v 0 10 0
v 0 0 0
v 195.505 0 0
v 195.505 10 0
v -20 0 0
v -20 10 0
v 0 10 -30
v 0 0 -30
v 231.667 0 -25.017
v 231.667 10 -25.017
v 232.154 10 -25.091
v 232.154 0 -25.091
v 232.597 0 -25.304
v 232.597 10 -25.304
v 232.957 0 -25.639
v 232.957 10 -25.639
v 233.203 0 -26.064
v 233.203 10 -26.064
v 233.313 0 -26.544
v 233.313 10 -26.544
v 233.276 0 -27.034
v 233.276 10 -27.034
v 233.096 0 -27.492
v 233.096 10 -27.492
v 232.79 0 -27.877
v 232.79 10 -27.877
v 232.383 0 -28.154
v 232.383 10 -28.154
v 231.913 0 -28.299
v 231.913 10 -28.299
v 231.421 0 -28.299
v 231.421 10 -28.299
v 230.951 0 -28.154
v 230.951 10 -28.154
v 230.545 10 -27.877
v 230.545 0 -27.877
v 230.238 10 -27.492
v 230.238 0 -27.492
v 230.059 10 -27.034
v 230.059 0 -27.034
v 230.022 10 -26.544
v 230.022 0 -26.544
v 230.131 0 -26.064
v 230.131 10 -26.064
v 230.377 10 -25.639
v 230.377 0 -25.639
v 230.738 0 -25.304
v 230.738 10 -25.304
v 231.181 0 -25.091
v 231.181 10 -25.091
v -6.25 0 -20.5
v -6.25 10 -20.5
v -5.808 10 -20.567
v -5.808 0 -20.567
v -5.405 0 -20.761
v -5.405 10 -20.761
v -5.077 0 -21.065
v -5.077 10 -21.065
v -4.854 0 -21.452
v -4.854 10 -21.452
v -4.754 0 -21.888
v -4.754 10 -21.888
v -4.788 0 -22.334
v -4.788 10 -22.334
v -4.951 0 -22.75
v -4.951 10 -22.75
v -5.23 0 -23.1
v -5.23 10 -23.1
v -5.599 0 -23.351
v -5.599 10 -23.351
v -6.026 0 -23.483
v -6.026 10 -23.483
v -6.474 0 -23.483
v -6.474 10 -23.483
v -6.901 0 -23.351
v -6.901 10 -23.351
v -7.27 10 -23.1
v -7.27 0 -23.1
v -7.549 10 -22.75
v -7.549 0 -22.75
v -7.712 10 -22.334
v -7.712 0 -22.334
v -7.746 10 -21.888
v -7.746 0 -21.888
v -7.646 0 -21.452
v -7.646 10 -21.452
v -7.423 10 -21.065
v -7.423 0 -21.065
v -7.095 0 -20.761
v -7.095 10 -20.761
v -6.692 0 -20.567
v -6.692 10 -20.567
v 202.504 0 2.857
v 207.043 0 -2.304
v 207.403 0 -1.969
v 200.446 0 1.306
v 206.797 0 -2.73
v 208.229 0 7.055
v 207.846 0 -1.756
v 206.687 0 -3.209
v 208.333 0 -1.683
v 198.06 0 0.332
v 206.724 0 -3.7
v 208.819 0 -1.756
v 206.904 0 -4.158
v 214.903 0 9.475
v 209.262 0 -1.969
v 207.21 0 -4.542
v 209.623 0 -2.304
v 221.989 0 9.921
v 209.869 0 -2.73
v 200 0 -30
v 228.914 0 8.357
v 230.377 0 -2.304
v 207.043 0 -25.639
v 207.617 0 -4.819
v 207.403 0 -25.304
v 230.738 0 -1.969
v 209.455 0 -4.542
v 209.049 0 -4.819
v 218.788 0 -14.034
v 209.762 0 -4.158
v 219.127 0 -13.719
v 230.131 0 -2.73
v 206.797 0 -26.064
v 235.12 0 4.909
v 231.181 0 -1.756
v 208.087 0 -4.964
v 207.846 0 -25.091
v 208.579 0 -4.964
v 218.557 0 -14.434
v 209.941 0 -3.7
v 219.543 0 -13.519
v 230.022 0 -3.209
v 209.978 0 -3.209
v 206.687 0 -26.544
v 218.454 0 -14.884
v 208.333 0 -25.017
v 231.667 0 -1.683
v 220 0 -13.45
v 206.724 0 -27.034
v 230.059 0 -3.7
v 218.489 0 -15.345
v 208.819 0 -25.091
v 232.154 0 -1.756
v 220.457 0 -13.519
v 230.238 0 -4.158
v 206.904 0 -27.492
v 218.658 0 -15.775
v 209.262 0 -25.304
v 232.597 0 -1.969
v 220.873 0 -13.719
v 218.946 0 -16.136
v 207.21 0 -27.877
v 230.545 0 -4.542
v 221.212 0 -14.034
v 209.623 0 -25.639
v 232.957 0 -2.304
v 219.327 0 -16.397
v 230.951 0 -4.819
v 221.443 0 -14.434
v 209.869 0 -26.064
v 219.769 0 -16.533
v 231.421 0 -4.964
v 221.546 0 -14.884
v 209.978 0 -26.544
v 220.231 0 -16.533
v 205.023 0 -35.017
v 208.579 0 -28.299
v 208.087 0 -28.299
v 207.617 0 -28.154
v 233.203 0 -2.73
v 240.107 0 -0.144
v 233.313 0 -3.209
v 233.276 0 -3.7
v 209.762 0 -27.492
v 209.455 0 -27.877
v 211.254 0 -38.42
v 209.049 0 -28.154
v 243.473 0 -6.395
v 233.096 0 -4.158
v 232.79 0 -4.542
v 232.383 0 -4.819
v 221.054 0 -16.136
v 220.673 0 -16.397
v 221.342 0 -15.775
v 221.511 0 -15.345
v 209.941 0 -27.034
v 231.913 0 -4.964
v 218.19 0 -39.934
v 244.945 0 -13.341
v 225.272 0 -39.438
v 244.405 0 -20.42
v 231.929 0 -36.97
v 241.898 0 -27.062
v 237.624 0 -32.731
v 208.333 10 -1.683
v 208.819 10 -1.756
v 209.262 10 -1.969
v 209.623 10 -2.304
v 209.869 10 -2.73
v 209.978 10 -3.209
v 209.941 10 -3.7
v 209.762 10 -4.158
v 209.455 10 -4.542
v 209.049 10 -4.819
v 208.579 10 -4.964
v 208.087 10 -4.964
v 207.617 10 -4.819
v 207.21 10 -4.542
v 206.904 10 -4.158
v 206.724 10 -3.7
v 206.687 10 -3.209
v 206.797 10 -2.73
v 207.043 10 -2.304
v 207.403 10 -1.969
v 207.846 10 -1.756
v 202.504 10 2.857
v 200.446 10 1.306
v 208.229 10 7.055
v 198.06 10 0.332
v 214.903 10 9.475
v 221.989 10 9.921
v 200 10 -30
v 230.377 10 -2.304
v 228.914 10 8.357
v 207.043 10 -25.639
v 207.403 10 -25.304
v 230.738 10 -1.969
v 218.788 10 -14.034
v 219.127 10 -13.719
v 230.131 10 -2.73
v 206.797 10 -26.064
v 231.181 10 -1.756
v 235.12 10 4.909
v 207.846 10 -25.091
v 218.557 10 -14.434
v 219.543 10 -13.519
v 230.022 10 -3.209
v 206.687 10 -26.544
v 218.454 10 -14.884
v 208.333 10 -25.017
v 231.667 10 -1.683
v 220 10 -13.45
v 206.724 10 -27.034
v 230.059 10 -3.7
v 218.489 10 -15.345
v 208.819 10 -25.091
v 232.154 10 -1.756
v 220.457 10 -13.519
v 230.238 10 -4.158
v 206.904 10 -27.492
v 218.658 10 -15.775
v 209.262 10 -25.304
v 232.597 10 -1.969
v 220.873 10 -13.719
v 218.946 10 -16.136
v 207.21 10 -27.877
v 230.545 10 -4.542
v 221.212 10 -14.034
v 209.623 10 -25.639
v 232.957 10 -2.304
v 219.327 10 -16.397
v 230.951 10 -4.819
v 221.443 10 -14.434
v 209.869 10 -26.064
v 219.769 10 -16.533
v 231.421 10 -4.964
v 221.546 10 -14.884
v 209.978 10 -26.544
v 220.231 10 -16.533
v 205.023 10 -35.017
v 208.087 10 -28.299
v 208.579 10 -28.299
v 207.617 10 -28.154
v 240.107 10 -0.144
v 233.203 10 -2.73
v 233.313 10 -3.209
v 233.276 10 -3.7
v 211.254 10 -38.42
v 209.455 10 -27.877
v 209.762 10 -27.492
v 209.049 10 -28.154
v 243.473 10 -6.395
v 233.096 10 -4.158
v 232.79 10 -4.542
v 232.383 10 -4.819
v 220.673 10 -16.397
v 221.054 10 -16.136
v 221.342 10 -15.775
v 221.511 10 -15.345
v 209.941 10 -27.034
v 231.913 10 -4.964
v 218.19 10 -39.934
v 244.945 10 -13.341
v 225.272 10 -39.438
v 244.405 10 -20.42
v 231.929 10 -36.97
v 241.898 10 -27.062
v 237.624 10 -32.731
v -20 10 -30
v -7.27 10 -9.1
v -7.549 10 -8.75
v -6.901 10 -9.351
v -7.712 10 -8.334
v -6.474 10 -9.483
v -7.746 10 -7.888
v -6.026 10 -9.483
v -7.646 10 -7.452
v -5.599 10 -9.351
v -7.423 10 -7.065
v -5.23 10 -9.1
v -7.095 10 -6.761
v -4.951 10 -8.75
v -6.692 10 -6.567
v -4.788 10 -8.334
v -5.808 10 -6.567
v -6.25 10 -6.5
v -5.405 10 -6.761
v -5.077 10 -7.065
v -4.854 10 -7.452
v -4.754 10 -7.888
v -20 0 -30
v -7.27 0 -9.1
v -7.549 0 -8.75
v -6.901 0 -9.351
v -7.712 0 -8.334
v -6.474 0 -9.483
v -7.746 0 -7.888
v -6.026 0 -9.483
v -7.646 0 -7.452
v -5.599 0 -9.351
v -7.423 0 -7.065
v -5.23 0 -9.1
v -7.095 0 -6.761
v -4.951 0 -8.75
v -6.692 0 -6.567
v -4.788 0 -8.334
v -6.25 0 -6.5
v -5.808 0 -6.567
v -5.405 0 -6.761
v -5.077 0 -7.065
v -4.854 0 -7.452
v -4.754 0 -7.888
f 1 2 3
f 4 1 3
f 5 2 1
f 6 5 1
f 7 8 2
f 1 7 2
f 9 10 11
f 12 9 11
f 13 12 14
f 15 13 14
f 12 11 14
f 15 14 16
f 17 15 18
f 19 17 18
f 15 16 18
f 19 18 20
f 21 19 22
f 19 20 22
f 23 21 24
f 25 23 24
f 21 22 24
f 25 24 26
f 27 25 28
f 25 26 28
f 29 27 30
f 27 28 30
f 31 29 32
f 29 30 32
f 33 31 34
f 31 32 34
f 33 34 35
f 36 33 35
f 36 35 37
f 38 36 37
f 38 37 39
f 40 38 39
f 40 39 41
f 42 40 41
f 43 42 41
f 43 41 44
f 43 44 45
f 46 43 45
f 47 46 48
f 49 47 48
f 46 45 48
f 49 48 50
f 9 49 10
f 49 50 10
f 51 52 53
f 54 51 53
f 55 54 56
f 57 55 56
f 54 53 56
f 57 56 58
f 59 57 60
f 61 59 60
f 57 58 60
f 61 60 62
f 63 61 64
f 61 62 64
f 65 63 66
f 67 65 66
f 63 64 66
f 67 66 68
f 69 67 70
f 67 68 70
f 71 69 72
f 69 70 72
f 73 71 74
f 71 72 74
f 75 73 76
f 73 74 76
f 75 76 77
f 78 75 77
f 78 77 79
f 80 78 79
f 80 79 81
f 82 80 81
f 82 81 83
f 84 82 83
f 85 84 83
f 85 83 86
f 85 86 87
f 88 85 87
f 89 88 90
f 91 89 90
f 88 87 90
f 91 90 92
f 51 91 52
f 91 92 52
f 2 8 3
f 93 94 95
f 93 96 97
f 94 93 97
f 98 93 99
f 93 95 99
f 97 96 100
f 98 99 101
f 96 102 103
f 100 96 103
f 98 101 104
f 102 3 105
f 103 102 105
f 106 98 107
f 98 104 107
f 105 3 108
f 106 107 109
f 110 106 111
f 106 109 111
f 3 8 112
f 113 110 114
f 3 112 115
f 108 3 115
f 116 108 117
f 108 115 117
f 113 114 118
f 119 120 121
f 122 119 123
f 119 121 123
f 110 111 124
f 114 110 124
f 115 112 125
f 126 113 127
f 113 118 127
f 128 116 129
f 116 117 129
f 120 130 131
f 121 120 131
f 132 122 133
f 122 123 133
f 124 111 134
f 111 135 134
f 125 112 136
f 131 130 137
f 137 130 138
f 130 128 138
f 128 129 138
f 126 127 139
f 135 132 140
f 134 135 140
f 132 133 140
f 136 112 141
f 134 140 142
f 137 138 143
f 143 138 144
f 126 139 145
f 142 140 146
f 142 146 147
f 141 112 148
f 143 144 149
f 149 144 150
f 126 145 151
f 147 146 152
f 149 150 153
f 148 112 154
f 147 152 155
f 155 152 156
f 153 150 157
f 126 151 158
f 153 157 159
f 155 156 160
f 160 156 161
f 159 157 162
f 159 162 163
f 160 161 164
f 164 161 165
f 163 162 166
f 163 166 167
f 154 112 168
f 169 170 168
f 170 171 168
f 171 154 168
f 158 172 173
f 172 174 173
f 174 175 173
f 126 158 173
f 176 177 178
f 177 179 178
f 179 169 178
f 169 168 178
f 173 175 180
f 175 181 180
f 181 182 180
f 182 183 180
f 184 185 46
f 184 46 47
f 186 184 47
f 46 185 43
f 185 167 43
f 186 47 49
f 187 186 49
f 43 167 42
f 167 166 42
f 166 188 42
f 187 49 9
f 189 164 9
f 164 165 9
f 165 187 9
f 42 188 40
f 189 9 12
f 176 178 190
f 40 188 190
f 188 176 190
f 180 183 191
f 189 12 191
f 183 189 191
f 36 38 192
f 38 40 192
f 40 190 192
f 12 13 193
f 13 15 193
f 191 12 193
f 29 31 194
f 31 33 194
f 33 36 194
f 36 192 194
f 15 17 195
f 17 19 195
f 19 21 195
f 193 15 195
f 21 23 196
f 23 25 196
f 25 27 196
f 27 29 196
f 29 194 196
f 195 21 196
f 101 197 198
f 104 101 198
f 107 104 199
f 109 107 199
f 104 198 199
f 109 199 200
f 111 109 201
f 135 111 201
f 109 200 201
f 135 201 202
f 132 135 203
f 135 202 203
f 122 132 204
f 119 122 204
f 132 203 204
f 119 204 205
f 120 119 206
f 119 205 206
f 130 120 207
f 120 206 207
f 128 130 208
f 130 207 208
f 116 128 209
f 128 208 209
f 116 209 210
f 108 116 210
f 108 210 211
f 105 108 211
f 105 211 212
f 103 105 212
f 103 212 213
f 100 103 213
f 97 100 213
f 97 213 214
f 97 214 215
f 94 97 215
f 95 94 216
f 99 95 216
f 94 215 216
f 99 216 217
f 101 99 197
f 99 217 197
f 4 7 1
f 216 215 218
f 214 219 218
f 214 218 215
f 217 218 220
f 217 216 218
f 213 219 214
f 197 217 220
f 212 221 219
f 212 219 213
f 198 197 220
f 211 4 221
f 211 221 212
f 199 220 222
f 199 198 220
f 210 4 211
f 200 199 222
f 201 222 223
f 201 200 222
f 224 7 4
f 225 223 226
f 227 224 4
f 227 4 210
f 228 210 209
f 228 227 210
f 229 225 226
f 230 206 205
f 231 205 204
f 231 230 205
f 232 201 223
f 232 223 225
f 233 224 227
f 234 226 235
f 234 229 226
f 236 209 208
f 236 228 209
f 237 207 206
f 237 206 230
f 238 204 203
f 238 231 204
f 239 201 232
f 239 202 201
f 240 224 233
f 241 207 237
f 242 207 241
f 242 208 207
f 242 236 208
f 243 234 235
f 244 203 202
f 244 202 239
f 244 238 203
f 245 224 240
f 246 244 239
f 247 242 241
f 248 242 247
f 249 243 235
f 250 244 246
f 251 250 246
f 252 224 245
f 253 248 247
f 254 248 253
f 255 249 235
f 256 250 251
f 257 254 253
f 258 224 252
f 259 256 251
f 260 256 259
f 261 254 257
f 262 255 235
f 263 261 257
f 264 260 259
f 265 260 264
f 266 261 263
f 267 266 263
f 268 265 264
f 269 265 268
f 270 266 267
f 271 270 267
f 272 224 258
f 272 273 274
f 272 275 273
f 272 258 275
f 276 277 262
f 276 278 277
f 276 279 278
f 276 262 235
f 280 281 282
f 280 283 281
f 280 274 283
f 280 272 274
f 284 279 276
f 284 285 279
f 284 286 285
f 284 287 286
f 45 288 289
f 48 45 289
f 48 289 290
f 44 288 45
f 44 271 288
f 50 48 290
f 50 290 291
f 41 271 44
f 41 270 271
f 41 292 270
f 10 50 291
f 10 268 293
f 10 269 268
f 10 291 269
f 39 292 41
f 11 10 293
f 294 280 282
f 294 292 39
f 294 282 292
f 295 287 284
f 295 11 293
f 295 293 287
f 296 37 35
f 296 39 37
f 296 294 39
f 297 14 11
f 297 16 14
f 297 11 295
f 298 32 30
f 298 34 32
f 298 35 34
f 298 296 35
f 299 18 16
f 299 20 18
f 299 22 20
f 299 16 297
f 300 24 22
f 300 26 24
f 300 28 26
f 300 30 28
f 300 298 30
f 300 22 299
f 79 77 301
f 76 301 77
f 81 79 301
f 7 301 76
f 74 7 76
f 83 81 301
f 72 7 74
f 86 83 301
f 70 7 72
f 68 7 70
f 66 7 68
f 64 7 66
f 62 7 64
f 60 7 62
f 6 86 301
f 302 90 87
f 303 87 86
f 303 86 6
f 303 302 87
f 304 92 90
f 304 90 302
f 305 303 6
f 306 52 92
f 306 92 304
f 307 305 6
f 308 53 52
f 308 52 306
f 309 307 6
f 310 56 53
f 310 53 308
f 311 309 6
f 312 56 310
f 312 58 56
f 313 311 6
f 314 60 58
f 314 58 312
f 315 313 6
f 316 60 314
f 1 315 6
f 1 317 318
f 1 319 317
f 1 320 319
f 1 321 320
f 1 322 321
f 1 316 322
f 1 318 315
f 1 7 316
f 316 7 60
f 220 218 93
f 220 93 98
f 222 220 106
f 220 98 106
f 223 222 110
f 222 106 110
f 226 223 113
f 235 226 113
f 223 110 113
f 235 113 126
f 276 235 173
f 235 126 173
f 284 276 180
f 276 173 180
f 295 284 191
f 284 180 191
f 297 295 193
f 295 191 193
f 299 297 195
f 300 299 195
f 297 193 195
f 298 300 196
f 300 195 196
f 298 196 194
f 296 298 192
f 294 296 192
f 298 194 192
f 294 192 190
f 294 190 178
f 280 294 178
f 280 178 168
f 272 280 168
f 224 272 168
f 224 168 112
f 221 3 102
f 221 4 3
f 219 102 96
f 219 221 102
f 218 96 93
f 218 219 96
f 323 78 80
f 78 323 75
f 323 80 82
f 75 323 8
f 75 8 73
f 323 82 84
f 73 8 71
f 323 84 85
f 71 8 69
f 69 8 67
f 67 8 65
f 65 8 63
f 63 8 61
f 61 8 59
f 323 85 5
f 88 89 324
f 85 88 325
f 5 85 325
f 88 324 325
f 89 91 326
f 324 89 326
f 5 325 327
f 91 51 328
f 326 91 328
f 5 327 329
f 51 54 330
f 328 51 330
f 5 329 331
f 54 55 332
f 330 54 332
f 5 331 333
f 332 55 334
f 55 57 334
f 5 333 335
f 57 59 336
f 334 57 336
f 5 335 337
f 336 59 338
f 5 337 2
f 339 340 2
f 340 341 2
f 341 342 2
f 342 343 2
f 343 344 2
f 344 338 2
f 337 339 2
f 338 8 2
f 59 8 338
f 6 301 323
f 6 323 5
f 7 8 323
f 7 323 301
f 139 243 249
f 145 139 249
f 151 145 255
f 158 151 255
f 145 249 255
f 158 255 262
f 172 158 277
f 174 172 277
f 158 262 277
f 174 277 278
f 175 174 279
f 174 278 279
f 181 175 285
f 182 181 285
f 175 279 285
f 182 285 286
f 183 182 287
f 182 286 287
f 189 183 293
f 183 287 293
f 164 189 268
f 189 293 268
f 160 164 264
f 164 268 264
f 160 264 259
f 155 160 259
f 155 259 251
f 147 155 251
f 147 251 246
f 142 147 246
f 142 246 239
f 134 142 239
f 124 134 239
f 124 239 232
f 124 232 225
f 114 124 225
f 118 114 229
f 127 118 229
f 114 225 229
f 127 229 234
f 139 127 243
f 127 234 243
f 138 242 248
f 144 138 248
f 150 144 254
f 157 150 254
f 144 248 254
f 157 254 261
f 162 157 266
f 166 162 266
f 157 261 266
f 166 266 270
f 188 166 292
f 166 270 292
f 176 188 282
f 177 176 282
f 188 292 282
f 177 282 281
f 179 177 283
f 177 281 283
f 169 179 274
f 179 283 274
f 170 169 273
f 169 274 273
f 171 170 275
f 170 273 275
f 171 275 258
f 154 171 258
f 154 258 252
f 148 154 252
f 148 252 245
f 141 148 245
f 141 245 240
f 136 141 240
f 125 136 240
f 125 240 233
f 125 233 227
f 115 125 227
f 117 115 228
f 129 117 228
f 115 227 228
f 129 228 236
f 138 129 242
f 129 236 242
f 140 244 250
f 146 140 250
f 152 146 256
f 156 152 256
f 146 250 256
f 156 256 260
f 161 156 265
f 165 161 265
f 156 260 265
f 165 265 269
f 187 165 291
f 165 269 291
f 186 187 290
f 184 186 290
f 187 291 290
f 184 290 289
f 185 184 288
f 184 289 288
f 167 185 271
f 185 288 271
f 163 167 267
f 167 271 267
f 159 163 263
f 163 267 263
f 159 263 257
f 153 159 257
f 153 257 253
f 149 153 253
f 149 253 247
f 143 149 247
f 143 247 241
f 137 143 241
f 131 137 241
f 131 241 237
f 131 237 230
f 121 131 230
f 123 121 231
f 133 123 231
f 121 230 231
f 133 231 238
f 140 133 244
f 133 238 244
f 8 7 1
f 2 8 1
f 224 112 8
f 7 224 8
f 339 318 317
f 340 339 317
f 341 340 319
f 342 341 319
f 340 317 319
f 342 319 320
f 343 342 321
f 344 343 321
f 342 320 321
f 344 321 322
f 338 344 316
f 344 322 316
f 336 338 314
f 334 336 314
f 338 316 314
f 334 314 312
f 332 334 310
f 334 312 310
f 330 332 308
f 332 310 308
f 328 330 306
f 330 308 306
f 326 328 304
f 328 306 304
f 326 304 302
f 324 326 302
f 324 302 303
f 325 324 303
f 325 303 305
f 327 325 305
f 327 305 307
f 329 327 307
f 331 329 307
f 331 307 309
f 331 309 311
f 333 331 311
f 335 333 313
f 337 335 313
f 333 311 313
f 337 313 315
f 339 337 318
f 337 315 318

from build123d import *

# Parameters (mm, degrees)
BOSS_EXTRUDE1_DEPTH     = 10
SKETCH4_W               = 30
SKETCH4_H               = 10
BOSS_EXTRUDE3_DEPTH     = 20
SKETCH5_R               = 1.5
CUT_EXTRUDE1_DEPTH      = 10
SKETCH6_R               = 1.65
SKETCH6_R_2             = 1.55
DRONE_MOUNT_HOLES_DEPTH = 10
FILLET2_R               = 10


with BuildPart() as part:
    # Sketch2 → Boss-Extrude1 (new body)
    with BuildSketch(Plane(origin=(0, 0, 0), x_dir=(1, 0, 0), z_dir=(0, 1, 0))):
        with BuildLine():
            Line((0, 0), (200, 0))
            ThreePointArc((200, 0), (245, 15), (200, 30))
            Line((200, 30), (0, 30))
            Line((0, 30), (0, 0))
        make_face()
    extrude(amount=BOSS_EXTRUDE1_DEPTH)

    # Sketch6 → Drone Mount Holes (cut)
    with BuildSketch(Plane(origin=(0, 10, 0), x_dir=(1, 0, 0), z_dir=(0, 1, 0))):
        with Locations(Location((231.66726189, 26.66726189, 0), (0, 0, 270))):
            Circle(SKETCH6_R)
        with Locations(Location((231.66726189, 3.33273811, 0), (0, 0, 270))):
            Circle(SKETCH6_R)
        with Locations(Location((208.33273811, 3.33273811, 0), (0, 0, 270))):
            Circle(SKETCH6_R)
        with Locations(Location((208.33273811, 26.66726189, 0), (0, 0, 270))):
            Circle(SKETCH6_R)
        with Locations(Location((220, 15, 0), (0, 0, 270))):
            Circle(SKETCH6_R_2)
    extrude(amount=-DRONE_MOUNT_HOLES_DEPTH, mode=Mode.SUBTRACT)

    # Fillet2
    fillet2_edges = [part.edges().sort_by_distance(p)[0] for p in [
        (200, 5, 0),
    ]]
    fillet(fillet2_edges, radius=FILLET2_R)


with BuildPart() as body_2:
    # Sketch4 → Boss-Extrude3 (new body)
    with BuildSketch(Plane.ZY):
        with Locations((-15, 5)):
            Rectangle(SKETCH4_W, SKETCH4_H)
    extrude(amount=BOSS_EXTRUDE3_DEPTH)

    # Sketch5 → Cut-Extrude1 (cut)
    with BuildSketch(Plane(origin=(0, 10, 0), x_dir=(1, 0, 0), z_dir=(0, 1, 0))):
        with Locations(Location((-6.25, 22, 0), (0, 0, 270))):
            Circle(SKETCH5_R)
        with Locations(Location((-6.25, 8, 0), (0, 0, 270))):
            Circle(SKETCH5_R)
    extrude(amount=-CUT_EXTRUDE1_DEPTH, mode=Mode.SUBTRACT)


solid = Compound([part.part, body_2.part])
